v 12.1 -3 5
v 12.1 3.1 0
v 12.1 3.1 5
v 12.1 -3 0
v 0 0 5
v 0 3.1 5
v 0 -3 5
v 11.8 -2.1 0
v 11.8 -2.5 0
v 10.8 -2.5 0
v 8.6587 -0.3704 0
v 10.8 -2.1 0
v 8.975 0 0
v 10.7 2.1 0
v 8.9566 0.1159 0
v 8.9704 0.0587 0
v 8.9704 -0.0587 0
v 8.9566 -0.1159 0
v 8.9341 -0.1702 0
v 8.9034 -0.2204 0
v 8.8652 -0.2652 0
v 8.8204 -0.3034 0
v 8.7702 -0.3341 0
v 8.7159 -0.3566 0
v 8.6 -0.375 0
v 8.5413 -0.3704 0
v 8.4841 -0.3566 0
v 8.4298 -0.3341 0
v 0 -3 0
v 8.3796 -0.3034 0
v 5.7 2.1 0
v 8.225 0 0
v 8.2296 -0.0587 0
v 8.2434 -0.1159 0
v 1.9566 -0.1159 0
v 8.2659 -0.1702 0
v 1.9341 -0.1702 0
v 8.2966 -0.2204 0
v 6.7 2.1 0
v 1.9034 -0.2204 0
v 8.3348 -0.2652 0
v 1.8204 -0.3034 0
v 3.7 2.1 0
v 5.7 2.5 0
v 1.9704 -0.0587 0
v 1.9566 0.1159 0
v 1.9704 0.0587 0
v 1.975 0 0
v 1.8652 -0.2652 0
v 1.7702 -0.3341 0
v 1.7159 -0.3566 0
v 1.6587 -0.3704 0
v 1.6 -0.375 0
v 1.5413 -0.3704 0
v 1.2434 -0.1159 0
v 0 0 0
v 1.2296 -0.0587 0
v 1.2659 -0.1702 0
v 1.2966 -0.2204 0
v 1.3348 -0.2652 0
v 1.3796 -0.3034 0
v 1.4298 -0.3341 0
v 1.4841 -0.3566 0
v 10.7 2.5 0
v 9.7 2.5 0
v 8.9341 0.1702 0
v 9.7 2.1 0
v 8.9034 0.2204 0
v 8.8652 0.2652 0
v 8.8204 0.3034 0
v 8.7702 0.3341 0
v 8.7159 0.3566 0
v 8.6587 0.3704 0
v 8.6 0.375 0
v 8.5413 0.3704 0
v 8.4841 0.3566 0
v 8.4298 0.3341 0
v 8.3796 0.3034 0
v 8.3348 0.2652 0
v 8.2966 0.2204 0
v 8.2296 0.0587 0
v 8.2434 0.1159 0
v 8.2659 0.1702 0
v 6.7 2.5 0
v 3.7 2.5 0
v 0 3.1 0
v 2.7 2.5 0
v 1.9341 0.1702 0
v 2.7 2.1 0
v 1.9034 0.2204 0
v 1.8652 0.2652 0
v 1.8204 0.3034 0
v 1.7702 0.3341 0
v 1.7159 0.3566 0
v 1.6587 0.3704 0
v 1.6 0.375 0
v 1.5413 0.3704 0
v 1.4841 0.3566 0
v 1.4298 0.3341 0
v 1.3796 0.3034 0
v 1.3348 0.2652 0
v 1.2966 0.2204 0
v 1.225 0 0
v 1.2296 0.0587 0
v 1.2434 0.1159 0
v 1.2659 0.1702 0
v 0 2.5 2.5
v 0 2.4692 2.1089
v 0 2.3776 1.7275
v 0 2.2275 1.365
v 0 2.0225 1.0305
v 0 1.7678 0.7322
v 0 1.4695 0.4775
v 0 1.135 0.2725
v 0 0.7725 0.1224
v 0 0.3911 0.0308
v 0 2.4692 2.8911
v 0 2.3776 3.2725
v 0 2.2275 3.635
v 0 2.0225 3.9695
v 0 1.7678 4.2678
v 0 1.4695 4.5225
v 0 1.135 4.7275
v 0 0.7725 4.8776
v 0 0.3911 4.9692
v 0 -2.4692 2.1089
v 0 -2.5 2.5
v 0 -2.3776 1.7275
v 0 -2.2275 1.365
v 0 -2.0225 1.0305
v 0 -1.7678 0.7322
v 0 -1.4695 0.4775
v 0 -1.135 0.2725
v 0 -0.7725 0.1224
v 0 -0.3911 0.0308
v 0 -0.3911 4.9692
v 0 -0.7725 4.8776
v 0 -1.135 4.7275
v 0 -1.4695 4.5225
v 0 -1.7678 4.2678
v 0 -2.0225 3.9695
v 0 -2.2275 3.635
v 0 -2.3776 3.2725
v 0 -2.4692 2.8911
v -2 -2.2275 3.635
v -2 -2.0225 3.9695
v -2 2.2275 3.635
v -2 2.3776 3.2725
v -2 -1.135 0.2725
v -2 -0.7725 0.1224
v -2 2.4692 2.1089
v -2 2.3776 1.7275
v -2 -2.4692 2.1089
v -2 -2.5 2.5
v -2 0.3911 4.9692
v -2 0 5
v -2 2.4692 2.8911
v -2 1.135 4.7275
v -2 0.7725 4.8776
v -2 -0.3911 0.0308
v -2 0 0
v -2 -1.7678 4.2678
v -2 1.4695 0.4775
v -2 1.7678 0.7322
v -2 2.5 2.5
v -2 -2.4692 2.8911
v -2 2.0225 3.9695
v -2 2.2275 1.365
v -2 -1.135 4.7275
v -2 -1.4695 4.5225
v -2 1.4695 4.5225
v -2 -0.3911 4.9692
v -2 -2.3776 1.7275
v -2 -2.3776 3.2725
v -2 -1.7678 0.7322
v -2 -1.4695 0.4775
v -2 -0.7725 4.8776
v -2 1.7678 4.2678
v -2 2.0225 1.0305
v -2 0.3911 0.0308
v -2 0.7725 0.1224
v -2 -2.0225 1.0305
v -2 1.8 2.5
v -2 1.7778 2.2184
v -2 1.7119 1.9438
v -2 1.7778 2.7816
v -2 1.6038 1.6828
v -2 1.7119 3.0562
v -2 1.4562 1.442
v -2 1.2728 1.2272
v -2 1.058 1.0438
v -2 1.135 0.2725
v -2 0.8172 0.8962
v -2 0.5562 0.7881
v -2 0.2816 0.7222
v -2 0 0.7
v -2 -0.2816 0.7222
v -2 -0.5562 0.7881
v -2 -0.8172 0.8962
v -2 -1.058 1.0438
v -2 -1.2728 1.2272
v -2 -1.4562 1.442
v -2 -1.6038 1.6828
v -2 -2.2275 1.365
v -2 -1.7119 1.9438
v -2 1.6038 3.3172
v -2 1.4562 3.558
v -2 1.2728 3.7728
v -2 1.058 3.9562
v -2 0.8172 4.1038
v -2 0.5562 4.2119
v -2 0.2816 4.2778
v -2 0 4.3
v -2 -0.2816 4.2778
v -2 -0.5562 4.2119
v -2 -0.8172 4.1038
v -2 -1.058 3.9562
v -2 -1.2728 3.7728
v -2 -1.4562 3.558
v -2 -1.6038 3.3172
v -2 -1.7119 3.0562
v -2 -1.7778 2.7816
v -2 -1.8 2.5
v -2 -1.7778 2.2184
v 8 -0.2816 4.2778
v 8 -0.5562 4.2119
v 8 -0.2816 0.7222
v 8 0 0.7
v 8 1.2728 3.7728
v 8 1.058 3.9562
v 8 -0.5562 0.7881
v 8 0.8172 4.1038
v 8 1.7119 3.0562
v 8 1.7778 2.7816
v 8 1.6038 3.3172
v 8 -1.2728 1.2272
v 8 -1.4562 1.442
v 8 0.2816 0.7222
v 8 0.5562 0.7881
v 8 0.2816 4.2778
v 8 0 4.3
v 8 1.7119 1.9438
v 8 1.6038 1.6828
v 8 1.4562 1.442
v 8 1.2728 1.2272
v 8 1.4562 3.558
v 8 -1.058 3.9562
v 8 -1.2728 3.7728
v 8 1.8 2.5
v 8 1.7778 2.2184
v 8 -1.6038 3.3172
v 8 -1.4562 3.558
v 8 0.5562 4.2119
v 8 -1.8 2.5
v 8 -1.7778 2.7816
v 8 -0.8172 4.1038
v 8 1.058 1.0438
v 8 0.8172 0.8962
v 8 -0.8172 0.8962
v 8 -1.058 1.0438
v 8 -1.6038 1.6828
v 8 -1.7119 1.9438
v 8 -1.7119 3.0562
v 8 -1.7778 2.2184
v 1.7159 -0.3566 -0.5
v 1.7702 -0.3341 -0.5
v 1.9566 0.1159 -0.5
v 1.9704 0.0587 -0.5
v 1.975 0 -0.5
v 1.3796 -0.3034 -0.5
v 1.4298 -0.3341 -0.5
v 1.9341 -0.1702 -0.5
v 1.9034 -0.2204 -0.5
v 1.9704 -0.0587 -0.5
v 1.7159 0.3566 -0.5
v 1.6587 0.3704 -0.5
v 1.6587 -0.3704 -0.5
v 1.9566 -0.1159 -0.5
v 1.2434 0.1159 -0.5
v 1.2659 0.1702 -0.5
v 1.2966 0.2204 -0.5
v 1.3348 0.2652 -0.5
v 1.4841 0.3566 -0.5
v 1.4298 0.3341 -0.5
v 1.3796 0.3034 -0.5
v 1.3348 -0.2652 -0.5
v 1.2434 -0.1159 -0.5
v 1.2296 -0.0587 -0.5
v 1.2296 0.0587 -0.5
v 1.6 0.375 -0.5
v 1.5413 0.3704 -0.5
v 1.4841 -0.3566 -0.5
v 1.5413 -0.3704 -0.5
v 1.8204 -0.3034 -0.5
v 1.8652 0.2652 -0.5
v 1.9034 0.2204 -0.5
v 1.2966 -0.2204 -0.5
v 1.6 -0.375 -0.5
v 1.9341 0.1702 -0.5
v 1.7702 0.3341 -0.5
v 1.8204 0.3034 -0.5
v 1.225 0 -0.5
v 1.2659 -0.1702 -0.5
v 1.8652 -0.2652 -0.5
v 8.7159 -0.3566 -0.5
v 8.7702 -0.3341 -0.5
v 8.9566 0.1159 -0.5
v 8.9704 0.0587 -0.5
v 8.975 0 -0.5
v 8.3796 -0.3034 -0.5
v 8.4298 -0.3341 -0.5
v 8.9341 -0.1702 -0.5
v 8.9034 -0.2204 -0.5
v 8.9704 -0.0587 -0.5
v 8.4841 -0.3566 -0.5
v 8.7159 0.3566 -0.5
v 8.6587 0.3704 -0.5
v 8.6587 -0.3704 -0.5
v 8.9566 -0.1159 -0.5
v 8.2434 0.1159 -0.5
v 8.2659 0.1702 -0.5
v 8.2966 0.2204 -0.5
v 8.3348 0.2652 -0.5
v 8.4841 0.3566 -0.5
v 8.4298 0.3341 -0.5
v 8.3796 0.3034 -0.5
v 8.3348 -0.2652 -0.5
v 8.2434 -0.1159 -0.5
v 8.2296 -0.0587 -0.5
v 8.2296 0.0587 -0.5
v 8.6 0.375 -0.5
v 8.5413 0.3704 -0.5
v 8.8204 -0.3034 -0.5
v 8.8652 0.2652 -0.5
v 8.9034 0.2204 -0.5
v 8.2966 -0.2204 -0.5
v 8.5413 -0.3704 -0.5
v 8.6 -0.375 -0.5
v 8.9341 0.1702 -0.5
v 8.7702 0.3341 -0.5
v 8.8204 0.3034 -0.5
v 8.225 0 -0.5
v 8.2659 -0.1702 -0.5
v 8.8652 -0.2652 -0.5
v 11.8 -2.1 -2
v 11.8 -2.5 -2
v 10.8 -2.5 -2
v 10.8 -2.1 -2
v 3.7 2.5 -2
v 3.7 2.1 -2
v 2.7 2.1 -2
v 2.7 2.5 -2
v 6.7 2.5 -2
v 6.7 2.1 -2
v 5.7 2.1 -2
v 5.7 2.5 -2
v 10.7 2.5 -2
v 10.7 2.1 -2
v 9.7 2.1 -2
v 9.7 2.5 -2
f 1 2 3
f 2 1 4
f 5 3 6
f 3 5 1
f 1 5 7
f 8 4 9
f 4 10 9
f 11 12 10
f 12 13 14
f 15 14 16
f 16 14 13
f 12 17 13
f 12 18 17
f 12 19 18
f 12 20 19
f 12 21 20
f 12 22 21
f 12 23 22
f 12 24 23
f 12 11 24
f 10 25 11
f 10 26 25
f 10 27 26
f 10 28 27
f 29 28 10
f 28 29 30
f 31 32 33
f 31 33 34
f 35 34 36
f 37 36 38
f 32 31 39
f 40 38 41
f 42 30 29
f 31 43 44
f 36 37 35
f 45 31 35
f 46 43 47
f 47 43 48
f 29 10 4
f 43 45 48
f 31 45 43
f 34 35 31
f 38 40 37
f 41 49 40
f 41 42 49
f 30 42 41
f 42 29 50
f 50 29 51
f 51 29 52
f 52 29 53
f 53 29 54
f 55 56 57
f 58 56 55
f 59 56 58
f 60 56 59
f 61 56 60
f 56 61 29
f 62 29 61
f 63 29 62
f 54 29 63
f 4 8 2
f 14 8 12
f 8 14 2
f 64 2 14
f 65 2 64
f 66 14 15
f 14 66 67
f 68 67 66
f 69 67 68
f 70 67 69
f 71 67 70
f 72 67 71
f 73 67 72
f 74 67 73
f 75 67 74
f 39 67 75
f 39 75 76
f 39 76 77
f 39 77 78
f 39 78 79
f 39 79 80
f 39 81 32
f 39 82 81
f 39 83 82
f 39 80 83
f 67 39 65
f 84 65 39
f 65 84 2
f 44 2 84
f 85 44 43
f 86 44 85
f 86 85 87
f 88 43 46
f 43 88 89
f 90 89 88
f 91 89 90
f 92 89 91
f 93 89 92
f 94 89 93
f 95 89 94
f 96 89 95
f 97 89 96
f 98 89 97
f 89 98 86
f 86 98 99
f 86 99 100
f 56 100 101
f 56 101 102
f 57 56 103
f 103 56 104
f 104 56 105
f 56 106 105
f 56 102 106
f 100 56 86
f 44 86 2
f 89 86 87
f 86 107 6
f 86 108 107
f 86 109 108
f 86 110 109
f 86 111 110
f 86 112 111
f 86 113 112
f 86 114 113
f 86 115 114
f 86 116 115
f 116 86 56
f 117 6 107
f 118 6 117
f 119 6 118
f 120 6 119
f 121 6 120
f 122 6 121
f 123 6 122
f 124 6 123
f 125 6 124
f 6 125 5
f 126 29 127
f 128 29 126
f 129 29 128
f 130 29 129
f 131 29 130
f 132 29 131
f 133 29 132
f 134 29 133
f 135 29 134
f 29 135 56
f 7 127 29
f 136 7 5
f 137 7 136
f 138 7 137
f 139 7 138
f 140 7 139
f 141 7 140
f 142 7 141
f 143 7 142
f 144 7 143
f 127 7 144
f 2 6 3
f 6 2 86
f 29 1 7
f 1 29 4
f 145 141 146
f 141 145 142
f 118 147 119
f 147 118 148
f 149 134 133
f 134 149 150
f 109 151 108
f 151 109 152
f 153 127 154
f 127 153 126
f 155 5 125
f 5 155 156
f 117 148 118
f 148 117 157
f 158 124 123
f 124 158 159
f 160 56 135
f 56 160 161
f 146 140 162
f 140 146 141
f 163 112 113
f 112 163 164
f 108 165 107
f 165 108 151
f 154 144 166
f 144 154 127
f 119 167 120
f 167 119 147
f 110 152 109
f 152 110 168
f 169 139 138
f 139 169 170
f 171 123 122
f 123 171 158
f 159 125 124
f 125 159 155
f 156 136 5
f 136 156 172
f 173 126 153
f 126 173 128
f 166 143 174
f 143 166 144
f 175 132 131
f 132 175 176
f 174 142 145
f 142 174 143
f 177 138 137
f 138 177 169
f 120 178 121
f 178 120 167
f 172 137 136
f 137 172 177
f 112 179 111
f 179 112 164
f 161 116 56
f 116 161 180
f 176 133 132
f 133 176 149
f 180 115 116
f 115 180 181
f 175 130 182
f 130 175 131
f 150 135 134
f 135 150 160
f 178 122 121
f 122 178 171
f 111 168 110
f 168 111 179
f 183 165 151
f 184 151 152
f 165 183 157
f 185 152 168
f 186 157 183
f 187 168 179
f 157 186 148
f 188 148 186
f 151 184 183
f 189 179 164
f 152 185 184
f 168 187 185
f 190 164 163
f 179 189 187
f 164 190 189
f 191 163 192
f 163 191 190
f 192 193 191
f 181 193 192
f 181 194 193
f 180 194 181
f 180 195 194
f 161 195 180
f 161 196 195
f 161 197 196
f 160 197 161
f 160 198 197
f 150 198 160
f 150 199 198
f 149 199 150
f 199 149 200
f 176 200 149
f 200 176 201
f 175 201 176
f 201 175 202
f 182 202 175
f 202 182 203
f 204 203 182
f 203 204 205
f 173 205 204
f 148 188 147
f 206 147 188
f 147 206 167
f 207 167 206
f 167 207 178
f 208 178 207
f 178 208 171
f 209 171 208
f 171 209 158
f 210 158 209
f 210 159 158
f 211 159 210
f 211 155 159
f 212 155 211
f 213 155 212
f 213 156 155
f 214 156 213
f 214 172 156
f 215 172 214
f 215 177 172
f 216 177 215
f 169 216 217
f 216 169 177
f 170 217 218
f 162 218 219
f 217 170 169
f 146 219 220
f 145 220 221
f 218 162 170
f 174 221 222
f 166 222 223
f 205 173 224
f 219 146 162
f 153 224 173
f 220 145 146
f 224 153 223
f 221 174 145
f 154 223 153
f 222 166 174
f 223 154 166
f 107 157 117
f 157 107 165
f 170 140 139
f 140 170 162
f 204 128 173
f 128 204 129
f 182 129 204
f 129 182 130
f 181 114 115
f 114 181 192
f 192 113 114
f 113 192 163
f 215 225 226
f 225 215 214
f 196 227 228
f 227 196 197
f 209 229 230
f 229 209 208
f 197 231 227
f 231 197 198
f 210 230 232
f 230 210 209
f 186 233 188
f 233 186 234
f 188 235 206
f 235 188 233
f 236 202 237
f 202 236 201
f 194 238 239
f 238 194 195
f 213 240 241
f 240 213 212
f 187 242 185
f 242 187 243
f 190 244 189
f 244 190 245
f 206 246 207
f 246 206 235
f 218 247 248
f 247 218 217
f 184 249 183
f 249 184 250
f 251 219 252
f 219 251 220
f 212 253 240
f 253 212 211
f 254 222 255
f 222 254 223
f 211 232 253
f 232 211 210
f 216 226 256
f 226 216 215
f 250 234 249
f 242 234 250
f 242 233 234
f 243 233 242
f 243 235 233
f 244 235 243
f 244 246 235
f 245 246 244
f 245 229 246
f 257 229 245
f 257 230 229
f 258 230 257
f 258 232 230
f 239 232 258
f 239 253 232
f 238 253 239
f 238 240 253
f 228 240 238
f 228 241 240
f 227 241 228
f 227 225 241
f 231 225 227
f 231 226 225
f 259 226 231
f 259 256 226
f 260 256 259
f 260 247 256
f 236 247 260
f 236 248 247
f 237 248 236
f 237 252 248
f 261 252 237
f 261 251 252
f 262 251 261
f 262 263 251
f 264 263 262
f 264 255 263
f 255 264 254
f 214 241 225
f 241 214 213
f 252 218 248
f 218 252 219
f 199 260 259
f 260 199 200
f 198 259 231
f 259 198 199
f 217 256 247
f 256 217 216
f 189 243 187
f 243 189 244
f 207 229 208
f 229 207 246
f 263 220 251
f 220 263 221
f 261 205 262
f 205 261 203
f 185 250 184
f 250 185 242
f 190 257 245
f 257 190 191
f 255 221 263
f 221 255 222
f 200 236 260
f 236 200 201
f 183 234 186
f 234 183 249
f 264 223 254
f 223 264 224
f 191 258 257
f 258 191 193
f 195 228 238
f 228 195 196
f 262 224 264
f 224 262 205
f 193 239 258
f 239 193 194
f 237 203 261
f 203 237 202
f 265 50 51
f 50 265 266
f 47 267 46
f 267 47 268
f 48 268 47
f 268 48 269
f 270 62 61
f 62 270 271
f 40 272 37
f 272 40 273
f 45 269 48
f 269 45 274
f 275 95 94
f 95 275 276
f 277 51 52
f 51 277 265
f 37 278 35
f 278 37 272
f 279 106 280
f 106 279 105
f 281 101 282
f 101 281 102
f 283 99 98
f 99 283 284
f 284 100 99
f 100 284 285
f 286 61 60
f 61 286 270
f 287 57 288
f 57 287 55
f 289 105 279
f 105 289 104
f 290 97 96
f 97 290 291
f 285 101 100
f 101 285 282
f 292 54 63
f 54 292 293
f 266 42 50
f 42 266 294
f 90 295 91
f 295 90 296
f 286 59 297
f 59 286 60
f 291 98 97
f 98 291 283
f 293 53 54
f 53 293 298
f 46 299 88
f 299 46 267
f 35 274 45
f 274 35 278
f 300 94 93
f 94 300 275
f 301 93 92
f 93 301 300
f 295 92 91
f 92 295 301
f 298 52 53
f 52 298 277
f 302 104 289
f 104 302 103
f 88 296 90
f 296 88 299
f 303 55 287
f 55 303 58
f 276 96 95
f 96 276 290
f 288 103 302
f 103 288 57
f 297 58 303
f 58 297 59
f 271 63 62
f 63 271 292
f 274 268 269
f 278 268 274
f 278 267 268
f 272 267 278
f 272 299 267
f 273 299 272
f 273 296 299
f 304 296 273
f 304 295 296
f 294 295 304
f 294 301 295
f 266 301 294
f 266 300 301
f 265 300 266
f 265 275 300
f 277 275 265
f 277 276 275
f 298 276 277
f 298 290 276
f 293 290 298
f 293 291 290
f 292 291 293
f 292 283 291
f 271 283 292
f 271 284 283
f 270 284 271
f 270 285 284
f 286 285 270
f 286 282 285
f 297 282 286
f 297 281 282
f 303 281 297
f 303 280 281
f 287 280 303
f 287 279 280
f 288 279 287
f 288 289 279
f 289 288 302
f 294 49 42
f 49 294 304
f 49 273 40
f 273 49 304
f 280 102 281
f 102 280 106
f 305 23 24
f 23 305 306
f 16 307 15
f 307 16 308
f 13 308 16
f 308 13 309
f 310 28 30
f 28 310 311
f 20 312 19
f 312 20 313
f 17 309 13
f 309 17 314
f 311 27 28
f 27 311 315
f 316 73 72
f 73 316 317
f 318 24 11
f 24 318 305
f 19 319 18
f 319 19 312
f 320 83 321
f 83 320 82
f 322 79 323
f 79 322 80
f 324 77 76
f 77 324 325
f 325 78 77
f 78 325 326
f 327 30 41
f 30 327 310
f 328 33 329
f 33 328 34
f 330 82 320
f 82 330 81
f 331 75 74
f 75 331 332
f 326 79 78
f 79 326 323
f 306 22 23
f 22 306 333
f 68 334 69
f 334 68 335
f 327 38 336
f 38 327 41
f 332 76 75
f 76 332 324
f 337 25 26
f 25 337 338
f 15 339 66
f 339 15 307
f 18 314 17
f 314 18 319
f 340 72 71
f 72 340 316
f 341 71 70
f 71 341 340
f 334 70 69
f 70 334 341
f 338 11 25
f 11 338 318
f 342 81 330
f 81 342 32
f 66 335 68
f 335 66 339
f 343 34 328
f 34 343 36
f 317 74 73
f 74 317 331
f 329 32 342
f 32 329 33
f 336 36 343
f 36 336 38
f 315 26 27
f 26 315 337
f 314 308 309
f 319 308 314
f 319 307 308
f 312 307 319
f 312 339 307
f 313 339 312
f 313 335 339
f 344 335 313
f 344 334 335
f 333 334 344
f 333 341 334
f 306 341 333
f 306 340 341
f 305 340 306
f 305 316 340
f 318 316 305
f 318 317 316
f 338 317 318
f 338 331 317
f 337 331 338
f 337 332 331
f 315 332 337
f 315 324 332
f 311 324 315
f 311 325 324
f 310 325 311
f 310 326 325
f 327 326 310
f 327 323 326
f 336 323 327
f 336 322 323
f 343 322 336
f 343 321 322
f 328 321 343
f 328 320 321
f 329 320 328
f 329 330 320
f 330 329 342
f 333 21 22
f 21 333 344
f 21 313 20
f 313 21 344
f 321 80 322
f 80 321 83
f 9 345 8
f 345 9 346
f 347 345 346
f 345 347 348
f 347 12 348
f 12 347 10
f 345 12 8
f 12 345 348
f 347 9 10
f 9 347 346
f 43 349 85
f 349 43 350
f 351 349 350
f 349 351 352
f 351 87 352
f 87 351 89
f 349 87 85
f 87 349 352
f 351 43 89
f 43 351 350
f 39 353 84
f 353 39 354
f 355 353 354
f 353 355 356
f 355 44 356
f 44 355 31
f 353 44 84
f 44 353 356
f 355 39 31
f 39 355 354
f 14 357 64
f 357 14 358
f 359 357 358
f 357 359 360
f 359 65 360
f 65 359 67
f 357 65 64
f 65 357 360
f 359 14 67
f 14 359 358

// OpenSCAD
$fn=40;

black = [0.2,0.2,0.2];
silver = [0.75,0.75,0.75];

// The model is centered on the front
// as per the data sheet
//
// And when I say "as per the data sheet",
// I mean that I've found three different
// copies with slightly different values.
//
// Oh well.
pins = [ [11.3, -2.3], [3.2, 2.3], [6.2, 2.3], [10.2, 2.3] ];

feet = [ [ 1.6, 0], [ 8.6, 0] ];

module body()
{
    difference() {
	union() {
	    translate([0,-3])
		cube([12.1, 6.1, 5]);
	    translate([0,0,2.5]) rotate([0,-90,0])
		cylinder(2,d=5);
	}
	translate([8,0,2.5]) rotate([0,-90,0])
	    cylinder(12,d=3.6);
    }
}

module pj320a()
{
    color(black) {
	body();

	// Feet or locating pins..
	translate([0,0,-0.5]) for (pos = feet)
	    translate(pos) cylinder(1, d=0.75);
    }

    color(silver) {
	// Pins
	for (pos = pins)
	    translate(pos) translate([0,0,1]) cube([1,0.4,6], center=true);
    }
}

pj320a();
